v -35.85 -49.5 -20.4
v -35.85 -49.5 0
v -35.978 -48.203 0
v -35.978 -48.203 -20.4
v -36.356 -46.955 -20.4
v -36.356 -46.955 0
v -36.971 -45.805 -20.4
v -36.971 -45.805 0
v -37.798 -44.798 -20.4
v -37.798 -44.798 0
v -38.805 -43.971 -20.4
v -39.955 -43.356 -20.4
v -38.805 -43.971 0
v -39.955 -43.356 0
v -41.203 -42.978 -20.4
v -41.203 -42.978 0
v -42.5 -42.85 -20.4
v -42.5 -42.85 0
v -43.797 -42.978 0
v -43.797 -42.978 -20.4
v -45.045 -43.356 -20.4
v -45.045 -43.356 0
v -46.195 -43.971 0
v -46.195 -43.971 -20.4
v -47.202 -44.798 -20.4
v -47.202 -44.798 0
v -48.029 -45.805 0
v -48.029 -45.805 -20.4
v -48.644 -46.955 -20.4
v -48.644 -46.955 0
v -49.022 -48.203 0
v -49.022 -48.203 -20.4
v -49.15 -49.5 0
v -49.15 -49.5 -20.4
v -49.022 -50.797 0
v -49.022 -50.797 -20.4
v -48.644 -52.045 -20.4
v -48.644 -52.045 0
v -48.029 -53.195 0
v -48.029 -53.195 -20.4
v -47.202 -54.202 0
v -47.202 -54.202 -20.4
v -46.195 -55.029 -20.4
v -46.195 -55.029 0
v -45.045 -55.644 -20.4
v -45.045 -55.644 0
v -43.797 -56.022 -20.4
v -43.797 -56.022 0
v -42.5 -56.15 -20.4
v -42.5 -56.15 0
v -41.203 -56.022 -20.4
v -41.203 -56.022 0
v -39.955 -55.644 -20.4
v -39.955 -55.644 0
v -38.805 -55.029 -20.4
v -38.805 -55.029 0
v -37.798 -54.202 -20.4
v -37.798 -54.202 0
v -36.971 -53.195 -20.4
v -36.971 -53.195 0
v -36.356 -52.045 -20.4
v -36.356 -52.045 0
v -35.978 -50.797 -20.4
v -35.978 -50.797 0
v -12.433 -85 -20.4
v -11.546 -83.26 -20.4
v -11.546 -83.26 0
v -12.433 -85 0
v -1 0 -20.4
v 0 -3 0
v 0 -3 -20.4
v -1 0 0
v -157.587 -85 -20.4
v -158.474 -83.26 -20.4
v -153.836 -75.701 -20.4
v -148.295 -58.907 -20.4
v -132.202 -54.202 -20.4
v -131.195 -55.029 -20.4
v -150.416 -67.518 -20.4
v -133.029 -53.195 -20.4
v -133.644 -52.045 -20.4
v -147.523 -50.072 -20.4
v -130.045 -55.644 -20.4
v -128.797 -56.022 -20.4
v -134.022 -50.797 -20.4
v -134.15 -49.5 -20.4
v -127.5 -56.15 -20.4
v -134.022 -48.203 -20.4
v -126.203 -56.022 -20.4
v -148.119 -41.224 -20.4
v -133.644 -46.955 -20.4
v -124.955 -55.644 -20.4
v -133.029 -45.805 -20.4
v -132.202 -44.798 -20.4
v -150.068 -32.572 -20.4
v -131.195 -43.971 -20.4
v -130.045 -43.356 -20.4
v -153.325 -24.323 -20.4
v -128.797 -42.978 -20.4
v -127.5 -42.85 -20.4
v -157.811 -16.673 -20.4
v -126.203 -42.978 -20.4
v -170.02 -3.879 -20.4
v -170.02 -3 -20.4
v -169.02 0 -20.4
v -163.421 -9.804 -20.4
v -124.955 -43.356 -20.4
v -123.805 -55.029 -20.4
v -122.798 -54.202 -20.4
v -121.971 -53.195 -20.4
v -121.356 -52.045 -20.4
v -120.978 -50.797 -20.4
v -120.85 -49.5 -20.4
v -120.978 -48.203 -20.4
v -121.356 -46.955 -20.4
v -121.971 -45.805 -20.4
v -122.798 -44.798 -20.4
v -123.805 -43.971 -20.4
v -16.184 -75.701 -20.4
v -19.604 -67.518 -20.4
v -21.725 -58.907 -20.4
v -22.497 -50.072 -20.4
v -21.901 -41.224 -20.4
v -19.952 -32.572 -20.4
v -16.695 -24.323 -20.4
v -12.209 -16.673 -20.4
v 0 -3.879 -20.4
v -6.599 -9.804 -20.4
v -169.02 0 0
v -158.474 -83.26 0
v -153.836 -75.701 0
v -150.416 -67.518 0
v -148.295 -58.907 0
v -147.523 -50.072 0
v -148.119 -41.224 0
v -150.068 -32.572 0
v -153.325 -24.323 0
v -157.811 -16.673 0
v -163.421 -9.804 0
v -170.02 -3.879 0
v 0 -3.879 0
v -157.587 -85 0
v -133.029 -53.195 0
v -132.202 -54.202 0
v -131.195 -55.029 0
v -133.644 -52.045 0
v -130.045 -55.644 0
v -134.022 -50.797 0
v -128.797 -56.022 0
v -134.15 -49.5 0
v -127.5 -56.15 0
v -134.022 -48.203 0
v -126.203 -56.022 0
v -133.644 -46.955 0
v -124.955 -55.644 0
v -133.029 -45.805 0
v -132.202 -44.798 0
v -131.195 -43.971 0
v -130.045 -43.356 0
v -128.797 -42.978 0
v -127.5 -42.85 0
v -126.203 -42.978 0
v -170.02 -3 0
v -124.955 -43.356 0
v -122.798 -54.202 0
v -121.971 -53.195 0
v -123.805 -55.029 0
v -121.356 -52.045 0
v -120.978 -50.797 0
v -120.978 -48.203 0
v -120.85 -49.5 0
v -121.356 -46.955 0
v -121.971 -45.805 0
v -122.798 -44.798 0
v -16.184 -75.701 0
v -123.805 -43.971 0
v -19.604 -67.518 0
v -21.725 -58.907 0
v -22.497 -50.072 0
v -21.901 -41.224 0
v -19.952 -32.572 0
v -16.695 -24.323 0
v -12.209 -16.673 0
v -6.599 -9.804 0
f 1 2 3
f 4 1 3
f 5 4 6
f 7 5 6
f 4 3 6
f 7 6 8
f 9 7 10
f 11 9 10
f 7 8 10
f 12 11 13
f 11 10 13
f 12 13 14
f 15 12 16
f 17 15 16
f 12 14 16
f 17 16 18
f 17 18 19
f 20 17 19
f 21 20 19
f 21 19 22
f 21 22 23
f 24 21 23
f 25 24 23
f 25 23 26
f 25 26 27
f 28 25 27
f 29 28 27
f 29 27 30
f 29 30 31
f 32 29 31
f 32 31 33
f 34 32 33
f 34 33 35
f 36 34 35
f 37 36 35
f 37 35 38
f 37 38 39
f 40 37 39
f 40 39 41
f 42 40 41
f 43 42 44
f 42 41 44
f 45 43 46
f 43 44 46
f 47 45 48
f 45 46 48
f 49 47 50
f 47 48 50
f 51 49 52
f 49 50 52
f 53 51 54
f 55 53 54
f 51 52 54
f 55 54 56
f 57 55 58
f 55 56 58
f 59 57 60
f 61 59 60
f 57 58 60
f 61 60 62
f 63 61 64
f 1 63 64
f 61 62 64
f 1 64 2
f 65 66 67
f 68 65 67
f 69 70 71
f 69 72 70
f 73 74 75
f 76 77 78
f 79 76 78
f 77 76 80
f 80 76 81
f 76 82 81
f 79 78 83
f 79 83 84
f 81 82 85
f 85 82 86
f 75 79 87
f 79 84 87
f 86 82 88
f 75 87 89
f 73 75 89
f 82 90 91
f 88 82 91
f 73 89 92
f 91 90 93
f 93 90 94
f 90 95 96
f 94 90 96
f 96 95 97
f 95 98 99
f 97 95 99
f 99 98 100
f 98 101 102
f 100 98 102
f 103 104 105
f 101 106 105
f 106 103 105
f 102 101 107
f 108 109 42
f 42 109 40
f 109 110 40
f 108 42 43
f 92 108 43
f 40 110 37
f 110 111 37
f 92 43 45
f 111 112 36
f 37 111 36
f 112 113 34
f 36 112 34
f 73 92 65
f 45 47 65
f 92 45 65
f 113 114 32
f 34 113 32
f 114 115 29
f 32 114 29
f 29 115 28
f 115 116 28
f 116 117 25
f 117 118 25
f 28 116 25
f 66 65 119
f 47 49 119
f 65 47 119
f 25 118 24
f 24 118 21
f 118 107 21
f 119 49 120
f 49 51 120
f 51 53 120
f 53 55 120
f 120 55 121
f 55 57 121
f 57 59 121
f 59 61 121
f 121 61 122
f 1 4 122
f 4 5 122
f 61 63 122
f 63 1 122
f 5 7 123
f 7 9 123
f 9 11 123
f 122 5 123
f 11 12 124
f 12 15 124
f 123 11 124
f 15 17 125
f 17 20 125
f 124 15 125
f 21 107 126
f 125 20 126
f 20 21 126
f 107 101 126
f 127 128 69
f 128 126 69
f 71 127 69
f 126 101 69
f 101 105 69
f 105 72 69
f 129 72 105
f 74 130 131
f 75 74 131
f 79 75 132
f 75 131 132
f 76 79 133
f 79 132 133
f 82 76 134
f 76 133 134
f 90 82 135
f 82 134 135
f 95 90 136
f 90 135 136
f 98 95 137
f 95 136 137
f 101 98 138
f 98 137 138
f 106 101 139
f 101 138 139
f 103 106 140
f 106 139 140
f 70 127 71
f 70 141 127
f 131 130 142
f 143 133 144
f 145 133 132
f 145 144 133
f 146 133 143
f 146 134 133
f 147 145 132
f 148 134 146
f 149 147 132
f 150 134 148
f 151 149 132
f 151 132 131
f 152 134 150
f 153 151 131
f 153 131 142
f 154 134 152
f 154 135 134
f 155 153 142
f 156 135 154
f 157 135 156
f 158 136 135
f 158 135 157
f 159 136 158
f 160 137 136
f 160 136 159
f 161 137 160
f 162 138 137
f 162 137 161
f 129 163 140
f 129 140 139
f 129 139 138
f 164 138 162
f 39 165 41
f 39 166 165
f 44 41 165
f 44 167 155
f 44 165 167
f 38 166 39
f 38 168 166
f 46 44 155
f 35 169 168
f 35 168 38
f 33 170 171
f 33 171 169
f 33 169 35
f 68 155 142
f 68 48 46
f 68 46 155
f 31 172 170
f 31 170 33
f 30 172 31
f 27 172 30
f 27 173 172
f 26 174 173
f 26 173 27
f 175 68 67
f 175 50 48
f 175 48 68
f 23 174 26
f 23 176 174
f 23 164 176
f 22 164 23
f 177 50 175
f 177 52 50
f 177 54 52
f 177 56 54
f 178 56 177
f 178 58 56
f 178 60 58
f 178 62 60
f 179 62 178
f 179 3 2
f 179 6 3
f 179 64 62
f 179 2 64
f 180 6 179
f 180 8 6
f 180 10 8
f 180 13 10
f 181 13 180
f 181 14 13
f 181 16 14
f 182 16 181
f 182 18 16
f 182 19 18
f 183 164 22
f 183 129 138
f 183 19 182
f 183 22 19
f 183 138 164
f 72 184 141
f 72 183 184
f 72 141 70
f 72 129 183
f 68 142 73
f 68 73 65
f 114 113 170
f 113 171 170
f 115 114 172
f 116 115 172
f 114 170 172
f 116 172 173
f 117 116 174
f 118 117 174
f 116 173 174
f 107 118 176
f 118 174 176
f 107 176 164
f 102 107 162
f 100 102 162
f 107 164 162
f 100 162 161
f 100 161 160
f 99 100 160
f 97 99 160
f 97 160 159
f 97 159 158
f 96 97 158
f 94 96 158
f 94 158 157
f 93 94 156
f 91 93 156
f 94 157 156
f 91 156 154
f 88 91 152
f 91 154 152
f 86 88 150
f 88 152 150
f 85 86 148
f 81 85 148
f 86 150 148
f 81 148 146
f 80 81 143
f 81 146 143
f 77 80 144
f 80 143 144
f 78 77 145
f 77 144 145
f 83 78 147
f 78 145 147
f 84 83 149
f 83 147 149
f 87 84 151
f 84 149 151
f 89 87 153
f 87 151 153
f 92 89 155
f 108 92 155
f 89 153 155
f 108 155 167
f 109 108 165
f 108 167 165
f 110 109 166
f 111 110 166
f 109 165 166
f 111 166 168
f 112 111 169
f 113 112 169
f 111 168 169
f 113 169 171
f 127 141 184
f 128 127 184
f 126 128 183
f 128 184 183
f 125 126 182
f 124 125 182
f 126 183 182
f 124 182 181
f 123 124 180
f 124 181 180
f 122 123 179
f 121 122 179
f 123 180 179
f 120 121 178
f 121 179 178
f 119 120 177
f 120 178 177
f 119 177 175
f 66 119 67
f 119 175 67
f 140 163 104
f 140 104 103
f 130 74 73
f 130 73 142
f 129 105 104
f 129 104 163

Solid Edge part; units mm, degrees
sketch "Sketch1" plane through (0, 0, 0) normal (0, 0, 1) x (1, 0, 0)
  line L0 (0, 0) -> (-170.02, 0)
  line L1 (-170.02, 0) -> (-170.02, -85)
  line L2 (-170.02, -85) -> (0, -85)
  line L3 (0, -85) -> (0, 0)
extrude "Protrusion1" add sketch "Sketch1" against normal blind 20.4
chamfer "Chamfer_2" [suppressed]
chamfer "Chamfer_3" [suppressed]
chamfer "Chamfer_9" [suppressed]
chamfer "Chamfer_10" [suppressed]
sketch "Sketch2" plane through (-85.01, -42.5, 0) normal (0, 0, 1) x (1, 0, 0)
  circle A0 centre (-42.49, -7) radius 6.65
  circle A1 centre (42.51, -7) radius 6.65
extrude "ExtrudedCutout_4" cut sketch "Sketch2" against normal blind 22
sketch "Sketch3" plane through (-85.01, -42.5, 0) normal (0, 0, 1) x (1, 0, 0)
  circle A0 centre (-120.01, -7) radius 57.5
  circle A1 centre (120.01, -7) radius 57.5
extrude "ExtrudedCutout_5" cut sketch "Sketch3" against normal blind 22
chamfer "Chamfer_14" distance 3 distance2 1 1 edges at (0, 0, -10.2) measured on face at (0, -3.2715, -16.796)
chamfer "Chamfer_15" distance 3 distance2 1 1 edges at (-170.02, 0, -10.2) measured on face at (-170.02, -0.6078, -16.796)
chamfer "Chamfer_16" distance 2.2 angle 63 1 edges at (-159.7873, -85, -10.2) measured on face at (-136.3571, -85, -16.796)
chamfer "Chamfer_17" distance 2.2 angle 63 1 edges at (-10.2327, -85, -10.2) measured on face at (-134.5017, -85, -16.796)
